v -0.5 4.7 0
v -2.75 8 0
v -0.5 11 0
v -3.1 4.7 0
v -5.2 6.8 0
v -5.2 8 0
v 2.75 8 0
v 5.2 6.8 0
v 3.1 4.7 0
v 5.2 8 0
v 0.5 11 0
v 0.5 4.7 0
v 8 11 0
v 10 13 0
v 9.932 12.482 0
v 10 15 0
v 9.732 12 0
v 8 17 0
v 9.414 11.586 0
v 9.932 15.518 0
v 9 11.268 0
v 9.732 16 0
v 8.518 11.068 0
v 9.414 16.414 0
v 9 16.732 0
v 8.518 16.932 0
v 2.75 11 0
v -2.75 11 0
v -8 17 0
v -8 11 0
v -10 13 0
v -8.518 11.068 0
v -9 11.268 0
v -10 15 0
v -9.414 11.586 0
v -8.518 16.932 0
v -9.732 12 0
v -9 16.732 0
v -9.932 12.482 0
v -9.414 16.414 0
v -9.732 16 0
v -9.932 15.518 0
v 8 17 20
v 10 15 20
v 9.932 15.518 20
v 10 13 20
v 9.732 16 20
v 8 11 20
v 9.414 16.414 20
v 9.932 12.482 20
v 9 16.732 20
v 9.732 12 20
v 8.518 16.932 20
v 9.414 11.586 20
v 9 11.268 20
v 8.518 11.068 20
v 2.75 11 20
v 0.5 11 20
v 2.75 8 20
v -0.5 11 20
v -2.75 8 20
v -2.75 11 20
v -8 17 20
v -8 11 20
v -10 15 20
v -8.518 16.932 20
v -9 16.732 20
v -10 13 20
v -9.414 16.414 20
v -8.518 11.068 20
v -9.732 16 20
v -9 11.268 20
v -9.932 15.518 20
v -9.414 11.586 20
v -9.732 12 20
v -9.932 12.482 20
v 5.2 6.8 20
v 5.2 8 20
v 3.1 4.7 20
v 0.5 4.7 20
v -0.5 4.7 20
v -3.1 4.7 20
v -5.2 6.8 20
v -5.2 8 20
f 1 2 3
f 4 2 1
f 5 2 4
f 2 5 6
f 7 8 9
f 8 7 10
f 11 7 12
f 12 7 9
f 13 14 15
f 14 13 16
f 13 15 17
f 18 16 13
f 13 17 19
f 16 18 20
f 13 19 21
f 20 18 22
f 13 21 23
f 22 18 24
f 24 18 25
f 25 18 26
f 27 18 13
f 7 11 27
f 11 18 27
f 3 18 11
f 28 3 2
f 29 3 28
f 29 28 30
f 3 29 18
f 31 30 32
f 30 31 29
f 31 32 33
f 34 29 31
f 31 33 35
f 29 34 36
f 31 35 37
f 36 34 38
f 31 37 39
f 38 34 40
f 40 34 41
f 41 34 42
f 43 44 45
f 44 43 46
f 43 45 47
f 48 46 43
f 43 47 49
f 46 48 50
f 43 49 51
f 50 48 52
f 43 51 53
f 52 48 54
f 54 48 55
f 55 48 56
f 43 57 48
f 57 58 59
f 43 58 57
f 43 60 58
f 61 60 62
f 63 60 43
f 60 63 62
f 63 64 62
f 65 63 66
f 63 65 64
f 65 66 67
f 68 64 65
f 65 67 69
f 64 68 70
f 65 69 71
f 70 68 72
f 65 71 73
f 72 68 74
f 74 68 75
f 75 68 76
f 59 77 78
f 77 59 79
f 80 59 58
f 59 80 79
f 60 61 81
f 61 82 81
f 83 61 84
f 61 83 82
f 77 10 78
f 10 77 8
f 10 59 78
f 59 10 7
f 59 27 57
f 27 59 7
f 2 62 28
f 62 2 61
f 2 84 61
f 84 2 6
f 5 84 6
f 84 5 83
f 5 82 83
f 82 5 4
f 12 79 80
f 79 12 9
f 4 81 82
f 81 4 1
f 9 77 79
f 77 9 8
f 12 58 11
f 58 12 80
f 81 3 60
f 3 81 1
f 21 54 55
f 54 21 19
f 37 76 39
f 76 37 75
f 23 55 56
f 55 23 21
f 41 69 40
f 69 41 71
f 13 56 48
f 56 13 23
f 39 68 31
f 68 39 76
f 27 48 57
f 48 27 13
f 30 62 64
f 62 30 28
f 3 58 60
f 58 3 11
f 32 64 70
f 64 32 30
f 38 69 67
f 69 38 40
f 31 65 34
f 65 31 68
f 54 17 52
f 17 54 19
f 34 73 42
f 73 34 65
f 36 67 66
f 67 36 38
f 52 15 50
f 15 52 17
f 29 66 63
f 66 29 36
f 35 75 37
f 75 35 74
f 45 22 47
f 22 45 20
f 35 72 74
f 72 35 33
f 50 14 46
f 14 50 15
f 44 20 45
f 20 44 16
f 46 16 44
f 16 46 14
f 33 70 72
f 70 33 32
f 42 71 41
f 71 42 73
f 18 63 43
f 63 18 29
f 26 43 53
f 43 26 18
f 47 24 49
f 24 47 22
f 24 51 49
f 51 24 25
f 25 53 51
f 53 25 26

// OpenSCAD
// Slide test: one T slider, 20 mm tall on a handle, for the sliding fit up
// and down the spine's rear T-slot. All numbers come from load-stack.scad
// (stem_w, head_w, head_clr, slide_h), so a fit found here is the master's.
// Prints standing, so the section is true.
use <load-stack.scad>
slide_test();
